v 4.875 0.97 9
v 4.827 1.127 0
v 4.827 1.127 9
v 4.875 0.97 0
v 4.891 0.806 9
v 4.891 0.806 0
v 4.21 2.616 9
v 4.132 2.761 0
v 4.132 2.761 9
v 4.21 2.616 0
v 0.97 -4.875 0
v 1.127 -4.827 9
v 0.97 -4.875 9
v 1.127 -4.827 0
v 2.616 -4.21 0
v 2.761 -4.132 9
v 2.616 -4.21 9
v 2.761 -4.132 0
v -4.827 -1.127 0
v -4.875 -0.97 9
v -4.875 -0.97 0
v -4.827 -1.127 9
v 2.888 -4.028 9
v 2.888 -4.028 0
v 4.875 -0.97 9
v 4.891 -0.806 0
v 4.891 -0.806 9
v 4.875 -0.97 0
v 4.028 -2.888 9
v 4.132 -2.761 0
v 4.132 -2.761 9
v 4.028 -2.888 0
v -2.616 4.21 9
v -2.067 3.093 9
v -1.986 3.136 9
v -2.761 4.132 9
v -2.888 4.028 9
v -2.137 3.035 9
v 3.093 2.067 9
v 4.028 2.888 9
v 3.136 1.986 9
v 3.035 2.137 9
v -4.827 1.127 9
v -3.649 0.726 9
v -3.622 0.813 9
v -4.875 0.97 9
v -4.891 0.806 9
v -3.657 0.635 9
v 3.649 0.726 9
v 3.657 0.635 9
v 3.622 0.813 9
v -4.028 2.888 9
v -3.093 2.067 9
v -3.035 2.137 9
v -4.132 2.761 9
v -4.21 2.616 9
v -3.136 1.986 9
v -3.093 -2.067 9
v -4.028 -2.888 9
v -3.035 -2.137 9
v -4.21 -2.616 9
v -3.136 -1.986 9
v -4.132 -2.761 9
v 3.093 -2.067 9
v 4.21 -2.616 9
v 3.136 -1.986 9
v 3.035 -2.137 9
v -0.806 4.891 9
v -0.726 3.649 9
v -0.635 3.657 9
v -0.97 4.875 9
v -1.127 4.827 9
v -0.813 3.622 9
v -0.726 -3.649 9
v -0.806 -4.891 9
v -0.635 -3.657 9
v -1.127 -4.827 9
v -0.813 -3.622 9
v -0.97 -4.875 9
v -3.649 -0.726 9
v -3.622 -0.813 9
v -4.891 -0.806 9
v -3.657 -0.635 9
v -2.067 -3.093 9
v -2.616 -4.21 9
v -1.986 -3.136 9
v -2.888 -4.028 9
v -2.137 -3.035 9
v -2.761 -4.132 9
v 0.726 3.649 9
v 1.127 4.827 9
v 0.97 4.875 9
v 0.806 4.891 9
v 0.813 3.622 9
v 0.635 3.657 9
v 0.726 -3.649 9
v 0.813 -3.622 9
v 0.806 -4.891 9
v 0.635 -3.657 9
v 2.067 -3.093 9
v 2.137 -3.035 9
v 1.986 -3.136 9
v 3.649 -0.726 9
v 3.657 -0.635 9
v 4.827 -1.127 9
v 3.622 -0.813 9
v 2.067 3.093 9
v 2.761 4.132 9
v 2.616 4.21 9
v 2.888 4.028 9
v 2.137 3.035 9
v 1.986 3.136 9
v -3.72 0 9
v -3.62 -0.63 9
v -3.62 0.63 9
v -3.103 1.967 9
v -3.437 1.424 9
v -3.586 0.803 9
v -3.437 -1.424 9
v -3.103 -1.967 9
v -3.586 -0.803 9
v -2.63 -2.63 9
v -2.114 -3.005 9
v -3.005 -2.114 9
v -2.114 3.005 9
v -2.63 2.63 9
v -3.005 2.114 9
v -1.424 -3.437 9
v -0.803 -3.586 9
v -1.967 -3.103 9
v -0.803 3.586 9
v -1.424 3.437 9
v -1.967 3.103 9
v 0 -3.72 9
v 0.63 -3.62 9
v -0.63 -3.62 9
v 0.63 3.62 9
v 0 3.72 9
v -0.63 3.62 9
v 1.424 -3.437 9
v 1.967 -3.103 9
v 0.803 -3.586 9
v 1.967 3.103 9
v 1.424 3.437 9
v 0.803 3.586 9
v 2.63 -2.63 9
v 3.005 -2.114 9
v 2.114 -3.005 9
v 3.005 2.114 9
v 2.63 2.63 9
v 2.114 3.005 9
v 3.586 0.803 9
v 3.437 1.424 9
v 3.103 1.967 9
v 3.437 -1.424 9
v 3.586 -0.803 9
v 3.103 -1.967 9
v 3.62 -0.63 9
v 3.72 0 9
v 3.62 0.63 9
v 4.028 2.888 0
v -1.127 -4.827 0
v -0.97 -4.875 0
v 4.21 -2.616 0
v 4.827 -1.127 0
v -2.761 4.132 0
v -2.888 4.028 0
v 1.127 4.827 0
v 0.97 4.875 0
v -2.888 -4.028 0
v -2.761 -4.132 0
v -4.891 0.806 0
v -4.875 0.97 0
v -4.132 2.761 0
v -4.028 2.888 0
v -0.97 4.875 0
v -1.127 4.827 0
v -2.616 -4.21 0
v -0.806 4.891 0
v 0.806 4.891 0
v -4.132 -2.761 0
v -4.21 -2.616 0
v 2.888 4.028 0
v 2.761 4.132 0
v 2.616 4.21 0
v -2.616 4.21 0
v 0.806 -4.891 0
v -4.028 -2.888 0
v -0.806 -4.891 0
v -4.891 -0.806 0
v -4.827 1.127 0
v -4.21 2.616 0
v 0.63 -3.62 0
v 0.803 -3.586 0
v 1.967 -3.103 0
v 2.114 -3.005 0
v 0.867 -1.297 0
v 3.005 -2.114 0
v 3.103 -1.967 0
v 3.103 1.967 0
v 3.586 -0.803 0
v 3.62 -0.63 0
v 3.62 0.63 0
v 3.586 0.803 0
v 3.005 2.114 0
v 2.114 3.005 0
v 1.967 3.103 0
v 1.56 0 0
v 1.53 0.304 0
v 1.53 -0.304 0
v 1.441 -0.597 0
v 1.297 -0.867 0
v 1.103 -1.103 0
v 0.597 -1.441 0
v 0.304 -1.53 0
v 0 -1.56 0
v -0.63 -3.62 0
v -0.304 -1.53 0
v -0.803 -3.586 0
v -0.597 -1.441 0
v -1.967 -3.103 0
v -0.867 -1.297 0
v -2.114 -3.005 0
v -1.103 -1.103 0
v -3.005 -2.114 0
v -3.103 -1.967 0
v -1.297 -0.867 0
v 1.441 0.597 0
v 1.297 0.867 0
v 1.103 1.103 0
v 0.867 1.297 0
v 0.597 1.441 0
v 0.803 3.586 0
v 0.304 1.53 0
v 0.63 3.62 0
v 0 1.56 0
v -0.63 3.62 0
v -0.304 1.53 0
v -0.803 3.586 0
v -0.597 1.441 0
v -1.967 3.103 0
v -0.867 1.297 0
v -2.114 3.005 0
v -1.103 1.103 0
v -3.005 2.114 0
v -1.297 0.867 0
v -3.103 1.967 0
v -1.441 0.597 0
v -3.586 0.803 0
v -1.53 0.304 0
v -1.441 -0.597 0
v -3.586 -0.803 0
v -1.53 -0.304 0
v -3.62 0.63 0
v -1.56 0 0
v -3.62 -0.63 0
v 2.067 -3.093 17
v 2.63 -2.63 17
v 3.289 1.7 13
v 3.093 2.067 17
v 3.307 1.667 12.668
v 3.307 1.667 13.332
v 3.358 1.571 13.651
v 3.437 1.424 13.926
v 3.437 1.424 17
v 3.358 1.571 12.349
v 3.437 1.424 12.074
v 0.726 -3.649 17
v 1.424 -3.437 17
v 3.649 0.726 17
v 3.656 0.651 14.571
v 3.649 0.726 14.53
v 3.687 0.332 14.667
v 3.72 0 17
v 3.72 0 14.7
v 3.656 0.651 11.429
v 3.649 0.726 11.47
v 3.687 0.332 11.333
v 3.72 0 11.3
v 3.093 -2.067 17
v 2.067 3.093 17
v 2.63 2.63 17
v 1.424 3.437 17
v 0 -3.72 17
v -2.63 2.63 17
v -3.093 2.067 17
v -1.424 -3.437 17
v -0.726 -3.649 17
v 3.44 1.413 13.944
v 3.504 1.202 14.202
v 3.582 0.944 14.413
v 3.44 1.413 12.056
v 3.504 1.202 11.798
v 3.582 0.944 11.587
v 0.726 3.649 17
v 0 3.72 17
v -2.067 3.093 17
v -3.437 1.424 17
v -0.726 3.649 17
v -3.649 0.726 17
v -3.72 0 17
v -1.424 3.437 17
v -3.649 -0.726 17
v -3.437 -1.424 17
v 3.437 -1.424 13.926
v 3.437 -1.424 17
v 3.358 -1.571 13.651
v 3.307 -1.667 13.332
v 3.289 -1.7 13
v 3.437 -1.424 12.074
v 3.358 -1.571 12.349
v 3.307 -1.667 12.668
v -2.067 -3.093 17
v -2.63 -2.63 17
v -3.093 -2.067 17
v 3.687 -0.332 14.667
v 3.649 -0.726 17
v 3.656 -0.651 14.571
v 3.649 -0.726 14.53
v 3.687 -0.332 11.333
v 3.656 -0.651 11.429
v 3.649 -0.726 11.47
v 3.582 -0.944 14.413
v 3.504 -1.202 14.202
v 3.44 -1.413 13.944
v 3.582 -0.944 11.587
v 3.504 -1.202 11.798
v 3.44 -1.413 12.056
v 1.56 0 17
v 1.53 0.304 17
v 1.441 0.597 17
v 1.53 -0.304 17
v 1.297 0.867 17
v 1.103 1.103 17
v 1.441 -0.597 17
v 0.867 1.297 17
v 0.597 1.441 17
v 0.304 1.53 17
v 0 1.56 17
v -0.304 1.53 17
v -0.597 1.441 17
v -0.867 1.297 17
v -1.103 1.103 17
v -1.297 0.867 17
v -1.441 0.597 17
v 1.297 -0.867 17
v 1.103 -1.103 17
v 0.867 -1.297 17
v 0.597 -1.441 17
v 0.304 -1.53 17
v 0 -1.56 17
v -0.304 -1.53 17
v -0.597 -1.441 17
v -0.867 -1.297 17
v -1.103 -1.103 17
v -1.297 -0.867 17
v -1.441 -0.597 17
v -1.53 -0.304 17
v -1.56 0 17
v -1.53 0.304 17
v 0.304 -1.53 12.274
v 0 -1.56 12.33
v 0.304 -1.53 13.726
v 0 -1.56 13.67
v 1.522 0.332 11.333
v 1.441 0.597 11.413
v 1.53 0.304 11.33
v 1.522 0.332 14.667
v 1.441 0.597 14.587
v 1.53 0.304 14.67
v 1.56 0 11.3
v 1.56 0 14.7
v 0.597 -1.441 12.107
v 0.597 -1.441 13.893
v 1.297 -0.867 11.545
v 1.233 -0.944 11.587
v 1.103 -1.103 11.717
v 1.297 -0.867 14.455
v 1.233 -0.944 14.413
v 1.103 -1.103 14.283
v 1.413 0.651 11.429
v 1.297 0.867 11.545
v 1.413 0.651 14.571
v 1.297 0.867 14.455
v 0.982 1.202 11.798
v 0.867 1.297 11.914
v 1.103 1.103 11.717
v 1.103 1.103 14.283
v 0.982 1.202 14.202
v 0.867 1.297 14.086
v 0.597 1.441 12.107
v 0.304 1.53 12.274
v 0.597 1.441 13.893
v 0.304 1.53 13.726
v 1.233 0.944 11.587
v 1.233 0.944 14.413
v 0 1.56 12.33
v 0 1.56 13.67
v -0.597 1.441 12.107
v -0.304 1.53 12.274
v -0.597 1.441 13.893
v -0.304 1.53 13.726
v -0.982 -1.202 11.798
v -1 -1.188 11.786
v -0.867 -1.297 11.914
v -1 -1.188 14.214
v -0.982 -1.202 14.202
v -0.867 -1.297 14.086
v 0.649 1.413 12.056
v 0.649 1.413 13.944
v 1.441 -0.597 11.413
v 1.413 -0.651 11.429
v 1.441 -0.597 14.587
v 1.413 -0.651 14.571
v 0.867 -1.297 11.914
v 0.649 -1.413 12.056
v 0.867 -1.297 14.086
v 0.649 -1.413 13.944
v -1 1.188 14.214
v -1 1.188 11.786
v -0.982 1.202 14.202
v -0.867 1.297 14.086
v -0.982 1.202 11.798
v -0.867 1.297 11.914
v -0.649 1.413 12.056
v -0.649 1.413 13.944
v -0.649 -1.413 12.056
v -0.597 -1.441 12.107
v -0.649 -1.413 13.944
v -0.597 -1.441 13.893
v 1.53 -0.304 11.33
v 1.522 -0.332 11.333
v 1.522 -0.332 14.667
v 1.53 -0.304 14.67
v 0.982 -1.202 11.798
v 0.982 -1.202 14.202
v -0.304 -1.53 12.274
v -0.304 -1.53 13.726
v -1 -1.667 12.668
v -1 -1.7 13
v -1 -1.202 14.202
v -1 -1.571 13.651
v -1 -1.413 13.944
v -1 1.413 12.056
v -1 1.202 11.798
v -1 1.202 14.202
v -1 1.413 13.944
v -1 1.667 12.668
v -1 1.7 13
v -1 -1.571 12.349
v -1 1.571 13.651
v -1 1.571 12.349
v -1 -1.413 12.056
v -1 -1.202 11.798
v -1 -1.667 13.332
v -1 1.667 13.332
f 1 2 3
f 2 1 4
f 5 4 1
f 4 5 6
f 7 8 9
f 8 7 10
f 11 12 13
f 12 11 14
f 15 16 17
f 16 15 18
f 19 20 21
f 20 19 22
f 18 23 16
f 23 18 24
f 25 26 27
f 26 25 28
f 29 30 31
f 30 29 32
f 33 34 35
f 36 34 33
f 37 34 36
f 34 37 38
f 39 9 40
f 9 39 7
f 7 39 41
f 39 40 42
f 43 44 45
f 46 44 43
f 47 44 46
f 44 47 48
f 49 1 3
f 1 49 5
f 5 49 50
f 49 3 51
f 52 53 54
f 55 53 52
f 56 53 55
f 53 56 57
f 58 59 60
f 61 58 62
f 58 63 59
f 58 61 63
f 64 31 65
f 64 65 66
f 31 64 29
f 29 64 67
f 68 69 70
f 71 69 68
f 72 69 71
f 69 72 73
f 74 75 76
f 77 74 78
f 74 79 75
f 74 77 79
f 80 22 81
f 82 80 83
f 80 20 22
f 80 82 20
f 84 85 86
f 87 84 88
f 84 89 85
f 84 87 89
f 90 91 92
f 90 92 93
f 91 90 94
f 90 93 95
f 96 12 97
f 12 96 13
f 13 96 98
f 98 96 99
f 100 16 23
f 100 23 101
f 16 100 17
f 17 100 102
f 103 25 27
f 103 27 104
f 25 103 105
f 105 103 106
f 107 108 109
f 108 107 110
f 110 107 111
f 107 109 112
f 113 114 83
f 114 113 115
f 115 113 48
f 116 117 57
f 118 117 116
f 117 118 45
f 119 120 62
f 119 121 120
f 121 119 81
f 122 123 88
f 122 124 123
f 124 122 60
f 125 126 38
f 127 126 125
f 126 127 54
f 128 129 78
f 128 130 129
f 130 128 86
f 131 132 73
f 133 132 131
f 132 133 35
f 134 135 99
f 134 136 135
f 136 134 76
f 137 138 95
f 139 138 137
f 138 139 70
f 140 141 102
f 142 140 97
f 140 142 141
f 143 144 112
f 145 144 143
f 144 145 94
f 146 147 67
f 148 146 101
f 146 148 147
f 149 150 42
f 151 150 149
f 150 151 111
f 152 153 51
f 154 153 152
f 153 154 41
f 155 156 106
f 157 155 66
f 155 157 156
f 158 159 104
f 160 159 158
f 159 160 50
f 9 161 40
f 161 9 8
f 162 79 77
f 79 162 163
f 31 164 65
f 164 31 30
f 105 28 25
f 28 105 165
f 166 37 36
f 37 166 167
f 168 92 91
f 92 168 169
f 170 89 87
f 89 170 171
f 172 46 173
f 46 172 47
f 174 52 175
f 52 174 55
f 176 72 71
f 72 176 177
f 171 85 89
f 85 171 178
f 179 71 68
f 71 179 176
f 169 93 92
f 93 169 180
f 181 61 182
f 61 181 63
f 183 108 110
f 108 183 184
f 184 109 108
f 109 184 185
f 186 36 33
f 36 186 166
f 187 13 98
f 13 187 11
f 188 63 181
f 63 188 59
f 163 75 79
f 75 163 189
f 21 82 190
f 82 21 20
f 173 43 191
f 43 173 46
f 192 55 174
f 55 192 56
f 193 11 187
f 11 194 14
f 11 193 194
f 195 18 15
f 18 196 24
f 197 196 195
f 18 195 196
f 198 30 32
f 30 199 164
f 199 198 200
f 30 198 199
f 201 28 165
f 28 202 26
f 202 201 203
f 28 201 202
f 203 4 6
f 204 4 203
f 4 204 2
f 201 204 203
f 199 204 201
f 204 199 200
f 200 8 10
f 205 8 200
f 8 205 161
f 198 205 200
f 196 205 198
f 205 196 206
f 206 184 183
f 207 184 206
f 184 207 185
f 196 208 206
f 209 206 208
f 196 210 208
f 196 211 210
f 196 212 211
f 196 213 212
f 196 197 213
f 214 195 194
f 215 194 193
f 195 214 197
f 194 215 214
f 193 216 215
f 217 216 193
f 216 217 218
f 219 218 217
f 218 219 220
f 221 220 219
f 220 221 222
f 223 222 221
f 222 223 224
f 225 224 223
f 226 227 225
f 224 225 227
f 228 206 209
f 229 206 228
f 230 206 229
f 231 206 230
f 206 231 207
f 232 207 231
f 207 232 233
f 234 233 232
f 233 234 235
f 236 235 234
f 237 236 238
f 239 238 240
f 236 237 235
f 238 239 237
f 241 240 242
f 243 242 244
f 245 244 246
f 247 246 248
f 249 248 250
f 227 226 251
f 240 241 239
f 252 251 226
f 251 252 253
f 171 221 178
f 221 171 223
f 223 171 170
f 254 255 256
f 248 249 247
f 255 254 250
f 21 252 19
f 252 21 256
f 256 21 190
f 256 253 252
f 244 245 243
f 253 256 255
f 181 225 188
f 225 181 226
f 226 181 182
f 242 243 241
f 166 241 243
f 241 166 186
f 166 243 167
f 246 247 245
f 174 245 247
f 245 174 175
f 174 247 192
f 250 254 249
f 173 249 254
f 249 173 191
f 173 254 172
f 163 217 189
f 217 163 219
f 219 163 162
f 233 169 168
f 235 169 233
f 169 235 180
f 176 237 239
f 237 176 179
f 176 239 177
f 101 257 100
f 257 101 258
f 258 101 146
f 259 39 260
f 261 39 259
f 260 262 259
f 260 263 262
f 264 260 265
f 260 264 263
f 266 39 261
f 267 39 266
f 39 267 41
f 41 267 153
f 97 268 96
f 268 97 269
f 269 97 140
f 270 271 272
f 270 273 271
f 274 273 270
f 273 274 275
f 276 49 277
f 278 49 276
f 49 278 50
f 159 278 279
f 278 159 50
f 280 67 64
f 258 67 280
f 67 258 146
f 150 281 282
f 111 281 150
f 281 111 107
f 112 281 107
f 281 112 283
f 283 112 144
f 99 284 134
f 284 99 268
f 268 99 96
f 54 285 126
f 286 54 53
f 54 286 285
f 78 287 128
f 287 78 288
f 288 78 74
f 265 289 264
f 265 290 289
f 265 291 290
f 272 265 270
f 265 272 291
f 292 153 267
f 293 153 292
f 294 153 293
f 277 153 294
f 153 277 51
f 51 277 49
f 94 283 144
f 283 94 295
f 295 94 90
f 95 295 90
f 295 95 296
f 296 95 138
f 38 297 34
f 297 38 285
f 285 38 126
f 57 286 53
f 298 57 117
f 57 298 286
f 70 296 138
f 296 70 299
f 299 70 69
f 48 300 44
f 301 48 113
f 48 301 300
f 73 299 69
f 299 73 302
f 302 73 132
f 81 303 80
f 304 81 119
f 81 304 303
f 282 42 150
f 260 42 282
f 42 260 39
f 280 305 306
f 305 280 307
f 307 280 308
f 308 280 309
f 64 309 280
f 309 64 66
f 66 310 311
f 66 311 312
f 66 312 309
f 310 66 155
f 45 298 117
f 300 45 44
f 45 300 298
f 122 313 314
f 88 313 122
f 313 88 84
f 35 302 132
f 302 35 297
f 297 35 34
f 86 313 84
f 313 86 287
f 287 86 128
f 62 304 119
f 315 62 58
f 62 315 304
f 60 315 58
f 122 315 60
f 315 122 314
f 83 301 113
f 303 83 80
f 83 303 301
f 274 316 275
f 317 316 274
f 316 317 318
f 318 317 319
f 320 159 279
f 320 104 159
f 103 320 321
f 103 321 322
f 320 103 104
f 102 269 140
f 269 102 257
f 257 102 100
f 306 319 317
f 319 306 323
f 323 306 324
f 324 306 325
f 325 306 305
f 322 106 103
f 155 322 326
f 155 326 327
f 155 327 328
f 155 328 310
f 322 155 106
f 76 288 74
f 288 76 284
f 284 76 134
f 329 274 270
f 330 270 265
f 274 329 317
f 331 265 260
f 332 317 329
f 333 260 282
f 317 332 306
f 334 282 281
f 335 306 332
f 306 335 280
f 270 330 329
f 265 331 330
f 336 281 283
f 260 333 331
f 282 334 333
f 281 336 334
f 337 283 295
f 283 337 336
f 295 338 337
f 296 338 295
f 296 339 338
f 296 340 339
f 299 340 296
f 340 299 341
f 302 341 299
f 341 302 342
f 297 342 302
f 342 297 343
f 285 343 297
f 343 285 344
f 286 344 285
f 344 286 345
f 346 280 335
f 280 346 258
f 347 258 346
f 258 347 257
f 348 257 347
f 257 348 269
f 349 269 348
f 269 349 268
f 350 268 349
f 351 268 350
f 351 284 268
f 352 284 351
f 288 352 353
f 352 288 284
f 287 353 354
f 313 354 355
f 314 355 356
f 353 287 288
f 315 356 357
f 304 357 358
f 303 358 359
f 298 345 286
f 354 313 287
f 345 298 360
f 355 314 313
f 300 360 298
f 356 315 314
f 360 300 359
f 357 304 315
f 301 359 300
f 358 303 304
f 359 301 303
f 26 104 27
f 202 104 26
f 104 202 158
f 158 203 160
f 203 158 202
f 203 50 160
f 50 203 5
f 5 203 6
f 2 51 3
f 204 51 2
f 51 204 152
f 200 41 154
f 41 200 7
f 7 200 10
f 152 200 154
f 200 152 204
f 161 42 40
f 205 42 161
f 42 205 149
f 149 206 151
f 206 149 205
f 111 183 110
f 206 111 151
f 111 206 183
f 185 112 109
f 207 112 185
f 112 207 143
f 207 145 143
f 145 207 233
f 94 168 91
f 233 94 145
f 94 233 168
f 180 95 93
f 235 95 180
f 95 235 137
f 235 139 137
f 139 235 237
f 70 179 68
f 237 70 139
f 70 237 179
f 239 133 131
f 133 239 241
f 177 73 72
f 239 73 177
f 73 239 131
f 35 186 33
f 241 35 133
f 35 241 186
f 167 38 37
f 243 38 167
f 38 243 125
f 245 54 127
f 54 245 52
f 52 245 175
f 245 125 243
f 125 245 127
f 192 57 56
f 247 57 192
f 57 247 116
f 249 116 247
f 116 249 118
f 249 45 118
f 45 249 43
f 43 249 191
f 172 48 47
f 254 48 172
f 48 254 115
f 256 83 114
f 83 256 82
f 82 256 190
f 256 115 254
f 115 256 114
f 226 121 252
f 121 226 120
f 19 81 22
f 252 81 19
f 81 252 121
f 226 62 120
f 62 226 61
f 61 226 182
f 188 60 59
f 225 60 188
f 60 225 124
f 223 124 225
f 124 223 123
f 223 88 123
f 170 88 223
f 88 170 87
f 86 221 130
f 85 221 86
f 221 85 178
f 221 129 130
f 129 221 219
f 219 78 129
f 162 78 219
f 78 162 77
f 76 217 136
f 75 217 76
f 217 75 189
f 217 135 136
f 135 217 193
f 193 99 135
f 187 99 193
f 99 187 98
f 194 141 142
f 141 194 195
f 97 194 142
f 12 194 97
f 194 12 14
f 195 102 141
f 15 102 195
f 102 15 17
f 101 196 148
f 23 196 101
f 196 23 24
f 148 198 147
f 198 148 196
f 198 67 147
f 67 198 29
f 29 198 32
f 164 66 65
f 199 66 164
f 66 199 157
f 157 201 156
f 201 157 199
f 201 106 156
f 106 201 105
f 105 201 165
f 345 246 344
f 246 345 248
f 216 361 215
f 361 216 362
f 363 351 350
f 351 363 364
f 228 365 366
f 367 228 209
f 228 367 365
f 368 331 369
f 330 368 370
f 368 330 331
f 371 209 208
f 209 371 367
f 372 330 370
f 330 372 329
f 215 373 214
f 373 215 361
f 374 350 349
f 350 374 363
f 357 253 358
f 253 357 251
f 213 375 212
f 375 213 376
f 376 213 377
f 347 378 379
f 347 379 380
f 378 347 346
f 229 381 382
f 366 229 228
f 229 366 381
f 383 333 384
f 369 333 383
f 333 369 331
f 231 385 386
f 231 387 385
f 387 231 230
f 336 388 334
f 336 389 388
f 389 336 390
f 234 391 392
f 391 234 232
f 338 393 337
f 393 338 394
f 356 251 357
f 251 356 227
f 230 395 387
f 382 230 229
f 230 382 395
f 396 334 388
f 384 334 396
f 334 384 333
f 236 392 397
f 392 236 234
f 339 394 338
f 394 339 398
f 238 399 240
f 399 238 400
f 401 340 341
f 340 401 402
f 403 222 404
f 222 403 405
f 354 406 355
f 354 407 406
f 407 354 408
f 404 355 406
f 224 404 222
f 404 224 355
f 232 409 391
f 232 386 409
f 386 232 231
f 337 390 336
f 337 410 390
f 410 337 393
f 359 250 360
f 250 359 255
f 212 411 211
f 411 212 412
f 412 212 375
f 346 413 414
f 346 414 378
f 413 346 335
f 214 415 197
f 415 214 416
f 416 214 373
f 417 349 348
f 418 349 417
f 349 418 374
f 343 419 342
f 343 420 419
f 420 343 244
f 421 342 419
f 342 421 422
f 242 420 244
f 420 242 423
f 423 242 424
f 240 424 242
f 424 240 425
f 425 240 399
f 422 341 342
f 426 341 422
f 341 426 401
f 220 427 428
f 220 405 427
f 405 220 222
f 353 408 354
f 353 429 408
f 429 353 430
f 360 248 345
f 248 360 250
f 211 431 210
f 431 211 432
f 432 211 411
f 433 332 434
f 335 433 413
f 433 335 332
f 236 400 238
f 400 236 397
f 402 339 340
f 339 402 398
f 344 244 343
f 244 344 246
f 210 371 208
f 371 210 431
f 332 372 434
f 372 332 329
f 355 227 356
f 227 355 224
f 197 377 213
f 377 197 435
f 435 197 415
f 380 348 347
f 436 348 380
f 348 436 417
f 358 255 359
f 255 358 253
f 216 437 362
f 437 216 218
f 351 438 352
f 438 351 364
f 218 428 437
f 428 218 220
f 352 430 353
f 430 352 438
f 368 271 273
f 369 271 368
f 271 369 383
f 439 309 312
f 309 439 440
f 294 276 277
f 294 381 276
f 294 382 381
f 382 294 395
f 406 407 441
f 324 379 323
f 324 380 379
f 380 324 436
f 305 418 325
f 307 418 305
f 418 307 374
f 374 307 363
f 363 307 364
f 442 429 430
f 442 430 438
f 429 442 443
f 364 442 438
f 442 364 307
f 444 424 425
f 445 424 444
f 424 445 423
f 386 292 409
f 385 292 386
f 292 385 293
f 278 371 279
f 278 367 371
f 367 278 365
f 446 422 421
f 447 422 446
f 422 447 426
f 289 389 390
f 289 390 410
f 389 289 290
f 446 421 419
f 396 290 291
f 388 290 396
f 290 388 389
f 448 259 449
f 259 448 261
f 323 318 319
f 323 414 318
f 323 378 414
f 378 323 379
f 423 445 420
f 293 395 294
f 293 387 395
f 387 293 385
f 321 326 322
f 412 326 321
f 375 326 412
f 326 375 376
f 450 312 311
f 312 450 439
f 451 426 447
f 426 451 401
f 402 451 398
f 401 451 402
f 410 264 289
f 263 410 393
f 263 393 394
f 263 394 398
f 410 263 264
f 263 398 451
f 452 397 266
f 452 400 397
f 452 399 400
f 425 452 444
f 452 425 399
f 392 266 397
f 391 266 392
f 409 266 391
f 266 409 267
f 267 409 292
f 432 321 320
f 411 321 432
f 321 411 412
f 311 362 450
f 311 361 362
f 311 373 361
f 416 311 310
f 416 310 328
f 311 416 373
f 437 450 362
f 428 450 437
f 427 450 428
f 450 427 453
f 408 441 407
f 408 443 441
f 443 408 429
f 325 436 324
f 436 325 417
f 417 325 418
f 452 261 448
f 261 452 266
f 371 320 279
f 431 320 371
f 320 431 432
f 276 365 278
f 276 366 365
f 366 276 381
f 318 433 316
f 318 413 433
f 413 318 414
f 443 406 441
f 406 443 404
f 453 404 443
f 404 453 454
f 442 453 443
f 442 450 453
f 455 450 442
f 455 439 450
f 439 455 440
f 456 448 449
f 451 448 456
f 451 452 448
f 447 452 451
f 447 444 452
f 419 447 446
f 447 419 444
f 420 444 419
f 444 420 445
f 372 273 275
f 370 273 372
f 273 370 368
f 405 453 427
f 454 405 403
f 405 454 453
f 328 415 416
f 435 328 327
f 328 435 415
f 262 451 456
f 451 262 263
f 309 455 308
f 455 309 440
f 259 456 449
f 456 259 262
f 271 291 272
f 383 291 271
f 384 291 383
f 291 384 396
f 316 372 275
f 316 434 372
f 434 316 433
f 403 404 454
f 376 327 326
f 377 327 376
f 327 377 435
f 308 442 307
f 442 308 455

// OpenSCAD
$fn = 32;

// ----------------------------------------------------------------------
// Timing pulley: GT2 16T, pitch 2 mm, 9.94 mm x 17 mm
// ----------------------------------------------------------------------

// --- parameters (mm) ---
belt_pitch = 2;           // belt pitch
n_teeth = 16;             // number of grooves
rim_w = 9;                // belt width between the flanges
tip_d = 9.94;             // tip circle diameter
root_d = 8.44;            // groove bottom diameter
groove_h = 0.75;          // groove depth
tooth_w = 1.5;            // groove width at the tip circle
shaft_d = 3.12;           // shaft bore
hub_d = 7.44;             // hub diameter
hub_h = 8;                // hub above the flange
bottom_z = 0;             // lowest point of the pulley
top_z = 17;               // highest point of the pulley
set_d = 3.4;              // set screw tap hole

module rim() {
  cylinder(h = rim_w, d = tip_d);
}

module groove_cutter() {
  /* belt tooth groove: deeper than wide, cut through the belt width */
  translate([root_d / 2, 0, 0])
    linear_extrude(height = rim_w)
      polygon(points = [[-0.6, -tooth_w * 0.42], [groove_h + 0.6, -tooth_w * 0.6],
                        [groove_h + 0.6, tooth_w * 0.6], [-0.6, tooth_w * 0.42]]);
}

module hub() {
  translate([0, 0, bottom_z]) cylinder(h = top_z - bottom_z, d = hub_d);
}

difference() {
  union() {
    rim();
    hub();
  }
  for (i = [0 : n_teeth - 1]) rotate([0, 0, i * 360 / n_teeth]) groove_cutter();
  translate([0, 0, bottom_z - 1]) cylinder(h = top_z - bottom_z + 2, d = shaft_d);
  translate([-1, 0, top_z - hub_h * 0.5]) rotate([0, 90, 0]) cylinder(h = hub_d / 2 + 3, d = set_d);
}
